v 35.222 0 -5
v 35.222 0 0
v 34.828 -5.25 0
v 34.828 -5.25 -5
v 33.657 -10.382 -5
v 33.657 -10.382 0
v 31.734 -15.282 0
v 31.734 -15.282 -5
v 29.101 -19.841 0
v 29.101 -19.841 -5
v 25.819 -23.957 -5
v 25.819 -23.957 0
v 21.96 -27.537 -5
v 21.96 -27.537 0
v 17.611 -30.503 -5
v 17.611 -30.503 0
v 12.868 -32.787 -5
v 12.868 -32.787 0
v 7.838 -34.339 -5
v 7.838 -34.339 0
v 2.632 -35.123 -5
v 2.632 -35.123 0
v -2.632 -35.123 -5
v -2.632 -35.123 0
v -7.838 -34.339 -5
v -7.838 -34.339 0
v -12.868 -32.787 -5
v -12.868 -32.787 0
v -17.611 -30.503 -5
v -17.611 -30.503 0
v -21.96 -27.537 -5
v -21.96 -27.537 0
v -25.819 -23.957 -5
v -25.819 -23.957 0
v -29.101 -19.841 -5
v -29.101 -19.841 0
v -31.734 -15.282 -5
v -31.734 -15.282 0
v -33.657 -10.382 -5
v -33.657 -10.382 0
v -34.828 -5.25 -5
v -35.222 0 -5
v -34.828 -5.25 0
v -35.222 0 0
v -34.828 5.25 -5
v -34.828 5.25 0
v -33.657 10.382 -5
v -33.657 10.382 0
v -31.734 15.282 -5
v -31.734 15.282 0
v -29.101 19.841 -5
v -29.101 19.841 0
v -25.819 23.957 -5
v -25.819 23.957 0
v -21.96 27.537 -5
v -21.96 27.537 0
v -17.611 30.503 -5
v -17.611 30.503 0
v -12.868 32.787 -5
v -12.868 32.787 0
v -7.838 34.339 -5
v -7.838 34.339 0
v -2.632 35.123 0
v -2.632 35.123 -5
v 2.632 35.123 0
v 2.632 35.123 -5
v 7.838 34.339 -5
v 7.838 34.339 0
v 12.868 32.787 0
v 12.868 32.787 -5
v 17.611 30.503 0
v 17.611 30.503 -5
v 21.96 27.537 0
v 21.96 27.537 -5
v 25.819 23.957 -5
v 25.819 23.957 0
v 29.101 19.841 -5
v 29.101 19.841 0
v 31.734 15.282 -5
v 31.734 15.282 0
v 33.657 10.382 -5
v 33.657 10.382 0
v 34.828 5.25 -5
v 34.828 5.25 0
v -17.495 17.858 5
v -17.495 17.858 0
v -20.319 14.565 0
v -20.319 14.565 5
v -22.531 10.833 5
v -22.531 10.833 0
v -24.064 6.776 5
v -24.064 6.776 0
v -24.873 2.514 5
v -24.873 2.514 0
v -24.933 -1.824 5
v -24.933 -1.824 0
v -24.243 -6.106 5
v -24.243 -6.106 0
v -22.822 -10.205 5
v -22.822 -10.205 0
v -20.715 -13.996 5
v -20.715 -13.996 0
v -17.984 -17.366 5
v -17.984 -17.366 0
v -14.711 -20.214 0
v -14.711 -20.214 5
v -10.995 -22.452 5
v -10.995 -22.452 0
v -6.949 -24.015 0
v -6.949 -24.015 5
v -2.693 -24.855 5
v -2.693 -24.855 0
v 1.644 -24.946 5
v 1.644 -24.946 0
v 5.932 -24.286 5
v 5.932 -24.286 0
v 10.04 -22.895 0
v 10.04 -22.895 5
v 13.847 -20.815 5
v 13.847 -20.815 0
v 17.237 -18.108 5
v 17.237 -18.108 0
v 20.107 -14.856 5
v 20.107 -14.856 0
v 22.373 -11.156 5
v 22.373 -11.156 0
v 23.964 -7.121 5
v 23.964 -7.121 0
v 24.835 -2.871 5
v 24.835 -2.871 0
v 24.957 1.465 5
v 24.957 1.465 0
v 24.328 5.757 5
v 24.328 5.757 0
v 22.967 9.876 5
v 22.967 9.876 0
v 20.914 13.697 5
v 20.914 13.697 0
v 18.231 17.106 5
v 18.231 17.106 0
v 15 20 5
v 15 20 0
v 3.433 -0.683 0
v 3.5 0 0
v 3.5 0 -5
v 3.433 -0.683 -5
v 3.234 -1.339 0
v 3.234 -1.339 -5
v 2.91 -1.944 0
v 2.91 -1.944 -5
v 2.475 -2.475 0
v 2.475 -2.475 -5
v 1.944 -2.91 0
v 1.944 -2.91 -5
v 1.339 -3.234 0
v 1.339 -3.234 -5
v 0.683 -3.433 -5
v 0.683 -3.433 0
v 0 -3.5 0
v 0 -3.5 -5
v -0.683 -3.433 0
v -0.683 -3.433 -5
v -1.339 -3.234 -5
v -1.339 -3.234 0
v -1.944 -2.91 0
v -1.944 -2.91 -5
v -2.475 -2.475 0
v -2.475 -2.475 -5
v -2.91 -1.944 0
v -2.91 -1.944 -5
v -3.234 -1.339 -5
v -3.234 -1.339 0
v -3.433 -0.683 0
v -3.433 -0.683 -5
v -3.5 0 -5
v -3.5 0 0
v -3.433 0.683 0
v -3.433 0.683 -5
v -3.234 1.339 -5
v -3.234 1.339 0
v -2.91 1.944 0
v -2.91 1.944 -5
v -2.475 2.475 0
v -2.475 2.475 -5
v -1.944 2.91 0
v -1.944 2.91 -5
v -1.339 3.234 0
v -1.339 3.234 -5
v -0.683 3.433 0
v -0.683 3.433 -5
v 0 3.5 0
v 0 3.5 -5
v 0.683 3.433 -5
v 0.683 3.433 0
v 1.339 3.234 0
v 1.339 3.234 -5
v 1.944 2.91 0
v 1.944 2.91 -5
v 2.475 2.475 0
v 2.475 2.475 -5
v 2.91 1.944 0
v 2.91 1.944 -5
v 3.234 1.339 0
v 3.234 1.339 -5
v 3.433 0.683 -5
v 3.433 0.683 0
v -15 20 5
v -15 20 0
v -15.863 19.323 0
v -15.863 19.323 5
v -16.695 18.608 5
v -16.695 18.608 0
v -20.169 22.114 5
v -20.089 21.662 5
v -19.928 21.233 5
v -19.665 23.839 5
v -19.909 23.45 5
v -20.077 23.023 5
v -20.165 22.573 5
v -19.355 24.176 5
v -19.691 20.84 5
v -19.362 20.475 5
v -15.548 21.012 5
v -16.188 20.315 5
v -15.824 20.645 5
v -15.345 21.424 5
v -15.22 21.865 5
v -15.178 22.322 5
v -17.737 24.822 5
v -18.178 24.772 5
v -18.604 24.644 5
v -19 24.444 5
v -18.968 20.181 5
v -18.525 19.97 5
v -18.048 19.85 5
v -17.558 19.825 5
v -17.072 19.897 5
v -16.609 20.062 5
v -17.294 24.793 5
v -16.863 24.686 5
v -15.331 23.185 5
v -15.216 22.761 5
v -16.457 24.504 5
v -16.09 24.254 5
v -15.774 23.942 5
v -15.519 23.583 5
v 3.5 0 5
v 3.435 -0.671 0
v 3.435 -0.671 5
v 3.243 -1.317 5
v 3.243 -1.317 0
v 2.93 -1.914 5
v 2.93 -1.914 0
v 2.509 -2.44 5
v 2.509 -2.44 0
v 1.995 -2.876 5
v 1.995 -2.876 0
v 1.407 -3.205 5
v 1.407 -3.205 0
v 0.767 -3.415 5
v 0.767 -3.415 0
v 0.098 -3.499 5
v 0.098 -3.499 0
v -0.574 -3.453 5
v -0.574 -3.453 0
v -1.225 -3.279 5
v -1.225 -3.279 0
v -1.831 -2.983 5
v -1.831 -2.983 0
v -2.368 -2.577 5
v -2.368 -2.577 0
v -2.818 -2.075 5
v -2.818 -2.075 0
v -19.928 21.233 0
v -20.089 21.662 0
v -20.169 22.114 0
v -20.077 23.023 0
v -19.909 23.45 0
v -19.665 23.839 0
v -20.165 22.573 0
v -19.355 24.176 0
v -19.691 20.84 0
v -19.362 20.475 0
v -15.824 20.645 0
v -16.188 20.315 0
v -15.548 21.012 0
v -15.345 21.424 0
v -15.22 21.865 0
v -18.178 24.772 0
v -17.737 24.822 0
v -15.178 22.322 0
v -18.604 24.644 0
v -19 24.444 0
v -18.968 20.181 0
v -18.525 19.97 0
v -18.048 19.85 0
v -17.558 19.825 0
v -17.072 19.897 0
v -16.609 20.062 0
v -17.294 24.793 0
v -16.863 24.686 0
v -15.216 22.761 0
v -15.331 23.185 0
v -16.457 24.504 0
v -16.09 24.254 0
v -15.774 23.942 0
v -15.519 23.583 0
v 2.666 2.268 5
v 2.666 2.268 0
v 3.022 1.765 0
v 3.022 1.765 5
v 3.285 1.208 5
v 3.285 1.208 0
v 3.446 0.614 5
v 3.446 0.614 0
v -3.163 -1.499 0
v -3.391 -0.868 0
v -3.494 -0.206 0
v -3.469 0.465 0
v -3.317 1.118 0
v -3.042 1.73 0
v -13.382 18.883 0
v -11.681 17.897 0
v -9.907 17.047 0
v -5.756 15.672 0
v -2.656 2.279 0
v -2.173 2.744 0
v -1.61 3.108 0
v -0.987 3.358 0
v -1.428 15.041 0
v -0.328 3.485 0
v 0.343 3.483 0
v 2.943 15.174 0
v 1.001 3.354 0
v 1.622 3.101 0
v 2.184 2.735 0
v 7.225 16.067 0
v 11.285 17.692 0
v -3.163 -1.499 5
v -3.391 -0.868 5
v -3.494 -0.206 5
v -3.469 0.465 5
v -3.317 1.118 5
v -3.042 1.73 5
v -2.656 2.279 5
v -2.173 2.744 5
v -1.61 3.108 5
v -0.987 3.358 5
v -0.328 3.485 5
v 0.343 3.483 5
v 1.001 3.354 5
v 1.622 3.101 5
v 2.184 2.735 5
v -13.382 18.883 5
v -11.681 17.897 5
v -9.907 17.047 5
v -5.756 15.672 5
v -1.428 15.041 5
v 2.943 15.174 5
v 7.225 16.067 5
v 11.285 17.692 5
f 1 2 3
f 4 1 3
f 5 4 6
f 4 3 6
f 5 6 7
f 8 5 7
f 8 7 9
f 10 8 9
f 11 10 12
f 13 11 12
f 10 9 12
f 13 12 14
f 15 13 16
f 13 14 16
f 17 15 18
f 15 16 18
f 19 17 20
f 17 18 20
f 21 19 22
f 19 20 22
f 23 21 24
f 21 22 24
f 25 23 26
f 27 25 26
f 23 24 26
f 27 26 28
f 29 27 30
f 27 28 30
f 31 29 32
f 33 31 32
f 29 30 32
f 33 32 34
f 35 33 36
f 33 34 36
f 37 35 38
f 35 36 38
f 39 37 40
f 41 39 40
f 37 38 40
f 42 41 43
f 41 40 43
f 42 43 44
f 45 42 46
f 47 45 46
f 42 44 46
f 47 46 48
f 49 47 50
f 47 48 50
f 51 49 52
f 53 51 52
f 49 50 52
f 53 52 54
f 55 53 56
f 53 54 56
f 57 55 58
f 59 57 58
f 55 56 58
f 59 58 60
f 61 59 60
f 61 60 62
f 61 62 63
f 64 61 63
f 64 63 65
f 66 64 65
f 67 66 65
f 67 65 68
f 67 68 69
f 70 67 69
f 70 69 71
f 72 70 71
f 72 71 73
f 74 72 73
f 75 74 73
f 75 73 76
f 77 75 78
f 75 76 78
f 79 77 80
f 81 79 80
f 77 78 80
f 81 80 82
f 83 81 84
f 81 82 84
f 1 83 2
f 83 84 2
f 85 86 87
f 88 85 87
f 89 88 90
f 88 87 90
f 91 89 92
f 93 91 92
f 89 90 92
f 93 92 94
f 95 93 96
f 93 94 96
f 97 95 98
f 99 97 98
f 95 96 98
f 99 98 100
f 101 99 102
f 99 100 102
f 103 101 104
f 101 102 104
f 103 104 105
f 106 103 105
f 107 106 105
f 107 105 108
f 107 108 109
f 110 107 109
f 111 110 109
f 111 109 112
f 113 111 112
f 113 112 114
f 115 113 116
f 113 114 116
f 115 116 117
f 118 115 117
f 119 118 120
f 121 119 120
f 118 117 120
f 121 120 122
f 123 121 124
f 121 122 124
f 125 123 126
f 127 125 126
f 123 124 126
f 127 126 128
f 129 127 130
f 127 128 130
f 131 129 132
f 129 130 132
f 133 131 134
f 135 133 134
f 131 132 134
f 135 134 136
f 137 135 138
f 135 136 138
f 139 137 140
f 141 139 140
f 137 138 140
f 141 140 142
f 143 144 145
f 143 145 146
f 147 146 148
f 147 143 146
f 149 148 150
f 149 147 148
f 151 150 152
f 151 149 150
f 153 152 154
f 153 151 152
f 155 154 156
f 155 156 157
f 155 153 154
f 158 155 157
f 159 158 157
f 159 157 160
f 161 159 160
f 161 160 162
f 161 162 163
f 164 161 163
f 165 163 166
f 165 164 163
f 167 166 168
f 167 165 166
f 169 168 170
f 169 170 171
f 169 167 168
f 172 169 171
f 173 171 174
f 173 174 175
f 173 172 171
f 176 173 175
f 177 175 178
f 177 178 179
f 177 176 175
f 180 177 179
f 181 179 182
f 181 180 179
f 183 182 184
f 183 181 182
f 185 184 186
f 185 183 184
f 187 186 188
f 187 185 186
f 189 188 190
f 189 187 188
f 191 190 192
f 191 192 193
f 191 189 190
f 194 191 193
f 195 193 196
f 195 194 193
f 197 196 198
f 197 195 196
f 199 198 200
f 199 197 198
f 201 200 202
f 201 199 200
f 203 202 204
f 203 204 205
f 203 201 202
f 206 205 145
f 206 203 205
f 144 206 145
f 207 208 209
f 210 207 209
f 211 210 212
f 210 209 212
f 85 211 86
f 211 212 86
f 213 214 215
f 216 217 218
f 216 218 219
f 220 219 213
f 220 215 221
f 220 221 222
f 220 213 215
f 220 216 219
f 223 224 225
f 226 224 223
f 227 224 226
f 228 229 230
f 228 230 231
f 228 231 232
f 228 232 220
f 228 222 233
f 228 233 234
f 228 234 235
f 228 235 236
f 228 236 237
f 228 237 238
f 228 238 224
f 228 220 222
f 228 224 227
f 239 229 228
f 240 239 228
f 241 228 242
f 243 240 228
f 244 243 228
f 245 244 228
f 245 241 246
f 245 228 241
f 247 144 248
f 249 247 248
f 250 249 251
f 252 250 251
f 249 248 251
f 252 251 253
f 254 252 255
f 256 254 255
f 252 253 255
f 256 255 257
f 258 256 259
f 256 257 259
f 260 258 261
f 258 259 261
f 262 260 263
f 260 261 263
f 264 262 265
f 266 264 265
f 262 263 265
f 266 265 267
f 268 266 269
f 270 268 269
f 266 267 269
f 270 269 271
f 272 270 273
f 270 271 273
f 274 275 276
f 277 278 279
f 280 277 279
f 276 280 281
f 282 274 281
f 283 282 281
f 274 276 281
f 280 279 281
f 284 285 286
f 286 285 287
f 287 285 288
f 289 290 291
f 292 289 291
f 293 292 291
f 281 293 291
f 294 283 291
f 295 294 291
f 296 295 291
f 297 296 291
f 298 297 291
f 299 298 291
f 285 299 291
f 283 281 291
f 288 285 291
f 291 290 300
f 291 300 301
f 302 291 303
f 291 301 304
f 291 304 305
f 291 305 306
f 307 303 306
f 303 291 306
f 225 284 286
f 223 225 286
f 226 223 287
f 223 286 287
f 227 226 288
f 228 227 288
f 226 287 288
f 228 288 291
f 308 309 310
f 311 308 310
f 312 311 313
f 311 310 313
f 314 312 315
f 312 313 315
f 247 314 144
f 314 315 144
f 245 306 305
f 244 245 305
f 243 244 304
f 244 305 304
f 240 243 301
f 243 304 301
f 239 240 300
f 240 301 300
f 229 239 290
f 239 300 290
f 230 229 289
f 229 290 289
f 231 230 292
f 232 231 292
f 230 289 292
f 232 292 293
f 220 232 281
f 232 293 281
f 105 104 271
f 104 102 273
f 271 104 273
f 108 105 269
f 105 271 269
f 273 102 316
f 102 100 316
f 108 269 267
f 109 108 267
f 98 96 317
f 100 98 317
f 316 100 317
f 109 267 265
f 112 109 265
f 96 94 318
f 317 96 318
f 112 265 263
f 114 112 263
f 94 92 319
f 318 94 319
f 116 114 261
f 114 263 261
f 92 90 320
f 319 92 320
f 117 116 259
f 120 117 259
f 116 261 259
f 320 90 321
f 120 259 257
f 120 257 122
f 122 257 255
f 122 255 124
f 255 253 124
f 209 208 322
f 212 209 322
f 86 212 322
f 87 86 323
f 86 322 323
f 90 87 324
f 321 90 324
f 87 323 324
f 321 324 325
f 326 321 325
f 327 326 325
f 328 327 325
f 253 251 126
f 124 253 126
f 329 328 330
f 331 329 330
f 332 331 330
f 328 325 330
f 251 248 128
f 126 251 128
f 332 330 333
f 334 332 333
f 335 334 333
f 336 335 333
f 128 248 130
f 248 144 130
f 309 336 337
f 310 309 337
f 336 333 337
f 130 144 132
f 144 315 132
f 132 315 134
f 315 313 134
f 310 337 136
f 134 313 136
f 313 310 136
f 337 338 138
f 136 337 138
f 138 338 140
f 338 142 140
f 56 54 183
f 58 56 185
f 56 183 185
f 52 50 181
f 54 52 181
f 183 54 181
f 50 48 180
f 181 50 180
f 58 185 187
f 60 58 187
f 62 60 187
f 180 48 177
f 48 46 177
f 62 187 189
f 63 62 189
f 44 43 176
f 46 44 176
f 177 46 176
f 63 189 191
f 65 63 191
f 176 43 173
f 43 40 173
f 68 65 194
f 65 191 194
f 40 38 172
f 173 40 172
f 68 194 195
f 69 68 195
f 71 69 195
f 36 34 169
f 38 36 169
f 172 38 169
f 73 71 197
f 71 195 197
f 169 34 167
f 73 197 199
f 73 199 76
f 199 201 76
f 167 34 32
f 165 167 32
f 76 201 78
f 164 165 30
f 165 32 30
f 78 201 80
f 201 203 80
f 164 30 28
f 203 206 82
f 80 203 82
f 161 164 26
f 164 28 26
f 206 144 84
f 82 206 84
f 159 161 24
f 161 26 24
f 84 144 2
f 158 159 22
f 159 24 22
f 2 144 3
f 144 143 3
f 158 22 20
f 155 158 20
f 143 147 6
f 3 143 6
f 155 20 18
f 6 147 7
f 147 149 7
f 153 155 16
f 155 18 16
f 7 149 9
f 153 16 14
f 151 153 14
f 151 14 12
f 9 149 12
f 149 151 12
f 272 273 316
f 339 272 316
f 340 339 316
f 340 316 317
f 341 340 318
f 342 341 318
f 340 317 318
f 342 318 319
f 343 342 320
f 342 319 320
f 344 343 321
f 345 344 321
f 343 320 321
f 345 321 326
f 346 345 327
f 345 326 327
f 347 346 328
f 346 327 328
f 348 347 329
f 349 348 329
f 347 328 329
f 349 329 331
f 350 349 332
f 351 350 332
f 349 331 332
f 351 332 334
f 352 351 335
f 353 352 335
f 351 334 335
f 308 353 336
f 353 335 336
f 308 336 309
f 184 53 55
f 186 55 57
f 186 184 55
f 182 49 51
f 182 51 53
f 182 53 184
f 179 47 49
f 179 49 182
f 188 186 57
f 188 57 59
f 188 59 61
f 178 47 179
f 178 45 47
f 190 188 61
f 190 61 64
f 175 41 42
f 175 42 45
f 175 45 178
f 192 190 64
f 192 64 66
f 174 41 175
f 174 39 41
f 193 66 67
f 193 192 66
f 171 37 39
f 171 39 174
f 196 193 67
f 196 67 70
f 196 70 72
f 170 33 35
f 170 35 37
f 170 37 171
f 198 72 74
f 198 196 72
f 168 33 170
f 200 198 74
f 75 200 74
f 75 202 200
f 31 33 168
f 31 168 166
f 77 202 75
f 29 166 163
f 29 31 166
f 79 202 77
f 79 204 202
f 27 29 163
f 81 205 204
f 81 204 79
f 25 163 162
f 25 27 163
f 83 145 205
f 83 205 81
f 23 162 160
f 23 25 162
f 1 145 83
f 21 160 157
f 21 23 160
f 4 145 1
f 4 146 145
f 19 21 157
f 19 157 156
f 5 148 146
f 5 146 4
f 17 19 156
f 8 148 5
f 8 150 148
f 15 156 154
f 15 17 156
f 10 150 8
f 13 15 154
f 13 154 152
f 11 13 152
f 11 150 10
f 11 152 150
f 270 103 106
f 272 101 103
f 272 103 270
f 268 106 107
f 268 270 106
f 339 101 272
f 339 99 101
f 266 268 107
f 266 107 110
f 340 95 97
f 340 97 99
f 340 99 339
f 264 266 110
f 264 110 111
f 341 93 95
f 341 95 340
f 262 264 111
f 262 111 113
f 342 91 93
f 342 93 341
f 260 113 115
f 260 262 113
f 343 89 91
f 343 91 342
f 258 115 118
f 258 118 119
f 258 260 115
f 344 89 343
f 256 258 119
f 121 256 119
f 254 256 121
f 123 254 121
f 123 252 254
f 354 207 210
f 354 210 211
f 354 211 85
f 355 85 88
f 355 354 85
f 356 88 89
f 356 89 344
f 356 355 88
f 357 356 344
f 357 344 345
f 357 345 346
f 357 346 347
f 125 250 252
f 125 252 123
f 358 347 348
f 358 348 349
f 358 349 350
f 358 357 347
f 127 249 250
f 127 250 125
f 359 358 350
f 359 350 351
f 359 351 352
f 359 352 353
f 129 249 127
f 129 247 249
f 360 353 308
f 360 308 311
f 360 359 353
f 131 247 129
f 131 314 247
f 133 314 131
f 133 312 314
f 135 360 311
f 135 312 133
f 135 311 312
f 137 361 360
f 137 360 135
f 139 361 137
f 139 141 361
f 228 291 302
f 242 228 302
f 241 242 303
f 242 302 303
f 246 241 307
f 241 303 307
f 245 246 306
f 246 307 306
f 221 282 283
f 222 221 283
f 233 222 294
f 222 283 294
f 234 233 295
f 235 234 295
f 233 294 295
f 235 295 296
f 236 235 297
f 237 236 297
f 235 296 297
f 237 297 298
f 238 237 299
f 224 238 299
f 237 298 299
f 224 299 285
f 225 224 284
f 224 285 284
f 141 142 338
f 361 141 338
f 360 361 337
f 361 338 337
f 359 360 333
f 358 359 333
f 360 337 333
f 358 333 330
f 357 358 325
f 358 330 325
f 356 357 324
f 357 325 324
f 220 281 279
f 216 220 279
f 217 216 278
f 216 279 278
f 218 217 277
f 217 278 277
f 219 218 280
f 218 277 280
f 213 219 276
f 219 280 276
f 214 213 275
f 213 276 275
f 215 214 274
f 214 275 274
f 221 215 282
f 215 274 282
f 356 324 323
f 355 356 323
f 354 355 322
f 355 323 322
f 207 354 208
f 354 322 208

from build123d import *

# Parameters (mm, degrees)
F1_DEPTH = 5
F2_R     = 35.2215875695
F2_R_2   = 3.5
F3_DEPTH = 5


with BuildPart() as f1:
    # F0 (on Top) → F1 (new body)
    with BuildSketch(Plane.XY):
        with BuildLine():
            ThreePointArc((-9.9073162791, 17.0468938018), (-12.5408855394, 18.3730217116), (-15, 20))
            ThreePointArc((-15, 20), (-16.2829033321, 18.9701623366), (-17.4952976137, 17.8581791179))
            Line((-17.4952976137, 17.8581791179), (-2.8184302399, -2.0751990225))
            ThreePointArc((-2.8184302399, -2.0751990225), (-2.172900388, 2.7438119294), (2.6658084384, 2.2679209355))
            Line((2.6658084384, 2.2679209355), (-9.9073162791, 17.0468938018))
        make_face()
        with BuildLine():
            Line((-2.8184302399, -2.0751990225), (-17.4952976137, 17.8581791179))
            ThreePointArc((-17.4952976137, 17.8581791179), (1.6442252637, -24.9458718685), (15, 20))
            ThreePointArc((15, 20), (2.9434785416, 15.1738860456), (-9.9073162791, 17.0468938018))
            Line((-9.9073162791, 17.0468938018), (2.6658084384, 2.2679209355))
            ThreePointArc((2.6658084384, 2.2679209355), (3.2848386212, 1.2082364143), (3.5, 0))
            ThreePointArc((3.5, 0), (1.0921296078, -3.325244791), (-2.8184302399, -2.0751990225))
        make_face()
    extrude(amount=F1_DEPTH)


with BuildPart() as f1b:
    # F0 (on Top) → F1, piece 2 (new body)
    with BuildSketch(Plane.XY):
        with BuildLine():
            ThreePointArc((-19.3548370435, 24.1762746795), (-17.6776695297, 22.3223304703), (-15.8237253205, 20.6451629565))
            ThreePointArc((-15.8237253205, 20.6451629565), (-15.3447678469, 21.4236816298), (-15.1776695297, 22.3223304703))
            ThreePointArc((-15.1776695297, 22.3223304703), (-15.3313562288, 23.1853564805), (-15.7735206451, 23.9422739957))
            ThreePointArc((-15.7735206451, 23.9422739957), (-17.5146688681, 24.8170109678), (-19.3548370435, 24.1762746795))
        make_face()
        with BuildLine():
            ThreePointArc((-19.3548370435, 24.1762746795), (-20.1650866388, 22.5728421974), (-19.6908339867, 20.8400454542))
            ThreePointArc((-19.6908339867, 20.8400454542), (-17.8034970657, 19.825498992), (-15.8237253205, 20.6451629565))
            ThreePointArc((-15.8237253205, 20.6451629565), (-17.6776695297, 22.3223304703), (-19.3548370435, 24.1762746795))
        make_face()
    extrude(amount=F1_DEPTH)


with BuildPart() as f3:
    # F2 (on face) → F3 (new body)
    with BuildSketch(Plane(origin=(0, 0, 0), x_dir=(1, 0, 0), z_dir=(0, 0, -1))):
        Circle(F2_R)
        with BuildLine():
            ThreePointArc((-15, -20), (0, 25), (15, -20))
            ThreePointArc((15, -20), (0, -15), (-15, -20))
        make_face(mode=Mode.SUBTRACT)
        with BuildLine():
            ThreePointArc((-15, -20), (0, -15), (15, -20))
            ThreePointArc((15, -20), (0, 25), (-15, -20))
        make_face()
        Circle(F2_R_2, mode=Mode.SUBTRACT)
    extrude(amount=F3_DEPTH)


solid = Compound([f1.part, f1b.part, f3.part])
